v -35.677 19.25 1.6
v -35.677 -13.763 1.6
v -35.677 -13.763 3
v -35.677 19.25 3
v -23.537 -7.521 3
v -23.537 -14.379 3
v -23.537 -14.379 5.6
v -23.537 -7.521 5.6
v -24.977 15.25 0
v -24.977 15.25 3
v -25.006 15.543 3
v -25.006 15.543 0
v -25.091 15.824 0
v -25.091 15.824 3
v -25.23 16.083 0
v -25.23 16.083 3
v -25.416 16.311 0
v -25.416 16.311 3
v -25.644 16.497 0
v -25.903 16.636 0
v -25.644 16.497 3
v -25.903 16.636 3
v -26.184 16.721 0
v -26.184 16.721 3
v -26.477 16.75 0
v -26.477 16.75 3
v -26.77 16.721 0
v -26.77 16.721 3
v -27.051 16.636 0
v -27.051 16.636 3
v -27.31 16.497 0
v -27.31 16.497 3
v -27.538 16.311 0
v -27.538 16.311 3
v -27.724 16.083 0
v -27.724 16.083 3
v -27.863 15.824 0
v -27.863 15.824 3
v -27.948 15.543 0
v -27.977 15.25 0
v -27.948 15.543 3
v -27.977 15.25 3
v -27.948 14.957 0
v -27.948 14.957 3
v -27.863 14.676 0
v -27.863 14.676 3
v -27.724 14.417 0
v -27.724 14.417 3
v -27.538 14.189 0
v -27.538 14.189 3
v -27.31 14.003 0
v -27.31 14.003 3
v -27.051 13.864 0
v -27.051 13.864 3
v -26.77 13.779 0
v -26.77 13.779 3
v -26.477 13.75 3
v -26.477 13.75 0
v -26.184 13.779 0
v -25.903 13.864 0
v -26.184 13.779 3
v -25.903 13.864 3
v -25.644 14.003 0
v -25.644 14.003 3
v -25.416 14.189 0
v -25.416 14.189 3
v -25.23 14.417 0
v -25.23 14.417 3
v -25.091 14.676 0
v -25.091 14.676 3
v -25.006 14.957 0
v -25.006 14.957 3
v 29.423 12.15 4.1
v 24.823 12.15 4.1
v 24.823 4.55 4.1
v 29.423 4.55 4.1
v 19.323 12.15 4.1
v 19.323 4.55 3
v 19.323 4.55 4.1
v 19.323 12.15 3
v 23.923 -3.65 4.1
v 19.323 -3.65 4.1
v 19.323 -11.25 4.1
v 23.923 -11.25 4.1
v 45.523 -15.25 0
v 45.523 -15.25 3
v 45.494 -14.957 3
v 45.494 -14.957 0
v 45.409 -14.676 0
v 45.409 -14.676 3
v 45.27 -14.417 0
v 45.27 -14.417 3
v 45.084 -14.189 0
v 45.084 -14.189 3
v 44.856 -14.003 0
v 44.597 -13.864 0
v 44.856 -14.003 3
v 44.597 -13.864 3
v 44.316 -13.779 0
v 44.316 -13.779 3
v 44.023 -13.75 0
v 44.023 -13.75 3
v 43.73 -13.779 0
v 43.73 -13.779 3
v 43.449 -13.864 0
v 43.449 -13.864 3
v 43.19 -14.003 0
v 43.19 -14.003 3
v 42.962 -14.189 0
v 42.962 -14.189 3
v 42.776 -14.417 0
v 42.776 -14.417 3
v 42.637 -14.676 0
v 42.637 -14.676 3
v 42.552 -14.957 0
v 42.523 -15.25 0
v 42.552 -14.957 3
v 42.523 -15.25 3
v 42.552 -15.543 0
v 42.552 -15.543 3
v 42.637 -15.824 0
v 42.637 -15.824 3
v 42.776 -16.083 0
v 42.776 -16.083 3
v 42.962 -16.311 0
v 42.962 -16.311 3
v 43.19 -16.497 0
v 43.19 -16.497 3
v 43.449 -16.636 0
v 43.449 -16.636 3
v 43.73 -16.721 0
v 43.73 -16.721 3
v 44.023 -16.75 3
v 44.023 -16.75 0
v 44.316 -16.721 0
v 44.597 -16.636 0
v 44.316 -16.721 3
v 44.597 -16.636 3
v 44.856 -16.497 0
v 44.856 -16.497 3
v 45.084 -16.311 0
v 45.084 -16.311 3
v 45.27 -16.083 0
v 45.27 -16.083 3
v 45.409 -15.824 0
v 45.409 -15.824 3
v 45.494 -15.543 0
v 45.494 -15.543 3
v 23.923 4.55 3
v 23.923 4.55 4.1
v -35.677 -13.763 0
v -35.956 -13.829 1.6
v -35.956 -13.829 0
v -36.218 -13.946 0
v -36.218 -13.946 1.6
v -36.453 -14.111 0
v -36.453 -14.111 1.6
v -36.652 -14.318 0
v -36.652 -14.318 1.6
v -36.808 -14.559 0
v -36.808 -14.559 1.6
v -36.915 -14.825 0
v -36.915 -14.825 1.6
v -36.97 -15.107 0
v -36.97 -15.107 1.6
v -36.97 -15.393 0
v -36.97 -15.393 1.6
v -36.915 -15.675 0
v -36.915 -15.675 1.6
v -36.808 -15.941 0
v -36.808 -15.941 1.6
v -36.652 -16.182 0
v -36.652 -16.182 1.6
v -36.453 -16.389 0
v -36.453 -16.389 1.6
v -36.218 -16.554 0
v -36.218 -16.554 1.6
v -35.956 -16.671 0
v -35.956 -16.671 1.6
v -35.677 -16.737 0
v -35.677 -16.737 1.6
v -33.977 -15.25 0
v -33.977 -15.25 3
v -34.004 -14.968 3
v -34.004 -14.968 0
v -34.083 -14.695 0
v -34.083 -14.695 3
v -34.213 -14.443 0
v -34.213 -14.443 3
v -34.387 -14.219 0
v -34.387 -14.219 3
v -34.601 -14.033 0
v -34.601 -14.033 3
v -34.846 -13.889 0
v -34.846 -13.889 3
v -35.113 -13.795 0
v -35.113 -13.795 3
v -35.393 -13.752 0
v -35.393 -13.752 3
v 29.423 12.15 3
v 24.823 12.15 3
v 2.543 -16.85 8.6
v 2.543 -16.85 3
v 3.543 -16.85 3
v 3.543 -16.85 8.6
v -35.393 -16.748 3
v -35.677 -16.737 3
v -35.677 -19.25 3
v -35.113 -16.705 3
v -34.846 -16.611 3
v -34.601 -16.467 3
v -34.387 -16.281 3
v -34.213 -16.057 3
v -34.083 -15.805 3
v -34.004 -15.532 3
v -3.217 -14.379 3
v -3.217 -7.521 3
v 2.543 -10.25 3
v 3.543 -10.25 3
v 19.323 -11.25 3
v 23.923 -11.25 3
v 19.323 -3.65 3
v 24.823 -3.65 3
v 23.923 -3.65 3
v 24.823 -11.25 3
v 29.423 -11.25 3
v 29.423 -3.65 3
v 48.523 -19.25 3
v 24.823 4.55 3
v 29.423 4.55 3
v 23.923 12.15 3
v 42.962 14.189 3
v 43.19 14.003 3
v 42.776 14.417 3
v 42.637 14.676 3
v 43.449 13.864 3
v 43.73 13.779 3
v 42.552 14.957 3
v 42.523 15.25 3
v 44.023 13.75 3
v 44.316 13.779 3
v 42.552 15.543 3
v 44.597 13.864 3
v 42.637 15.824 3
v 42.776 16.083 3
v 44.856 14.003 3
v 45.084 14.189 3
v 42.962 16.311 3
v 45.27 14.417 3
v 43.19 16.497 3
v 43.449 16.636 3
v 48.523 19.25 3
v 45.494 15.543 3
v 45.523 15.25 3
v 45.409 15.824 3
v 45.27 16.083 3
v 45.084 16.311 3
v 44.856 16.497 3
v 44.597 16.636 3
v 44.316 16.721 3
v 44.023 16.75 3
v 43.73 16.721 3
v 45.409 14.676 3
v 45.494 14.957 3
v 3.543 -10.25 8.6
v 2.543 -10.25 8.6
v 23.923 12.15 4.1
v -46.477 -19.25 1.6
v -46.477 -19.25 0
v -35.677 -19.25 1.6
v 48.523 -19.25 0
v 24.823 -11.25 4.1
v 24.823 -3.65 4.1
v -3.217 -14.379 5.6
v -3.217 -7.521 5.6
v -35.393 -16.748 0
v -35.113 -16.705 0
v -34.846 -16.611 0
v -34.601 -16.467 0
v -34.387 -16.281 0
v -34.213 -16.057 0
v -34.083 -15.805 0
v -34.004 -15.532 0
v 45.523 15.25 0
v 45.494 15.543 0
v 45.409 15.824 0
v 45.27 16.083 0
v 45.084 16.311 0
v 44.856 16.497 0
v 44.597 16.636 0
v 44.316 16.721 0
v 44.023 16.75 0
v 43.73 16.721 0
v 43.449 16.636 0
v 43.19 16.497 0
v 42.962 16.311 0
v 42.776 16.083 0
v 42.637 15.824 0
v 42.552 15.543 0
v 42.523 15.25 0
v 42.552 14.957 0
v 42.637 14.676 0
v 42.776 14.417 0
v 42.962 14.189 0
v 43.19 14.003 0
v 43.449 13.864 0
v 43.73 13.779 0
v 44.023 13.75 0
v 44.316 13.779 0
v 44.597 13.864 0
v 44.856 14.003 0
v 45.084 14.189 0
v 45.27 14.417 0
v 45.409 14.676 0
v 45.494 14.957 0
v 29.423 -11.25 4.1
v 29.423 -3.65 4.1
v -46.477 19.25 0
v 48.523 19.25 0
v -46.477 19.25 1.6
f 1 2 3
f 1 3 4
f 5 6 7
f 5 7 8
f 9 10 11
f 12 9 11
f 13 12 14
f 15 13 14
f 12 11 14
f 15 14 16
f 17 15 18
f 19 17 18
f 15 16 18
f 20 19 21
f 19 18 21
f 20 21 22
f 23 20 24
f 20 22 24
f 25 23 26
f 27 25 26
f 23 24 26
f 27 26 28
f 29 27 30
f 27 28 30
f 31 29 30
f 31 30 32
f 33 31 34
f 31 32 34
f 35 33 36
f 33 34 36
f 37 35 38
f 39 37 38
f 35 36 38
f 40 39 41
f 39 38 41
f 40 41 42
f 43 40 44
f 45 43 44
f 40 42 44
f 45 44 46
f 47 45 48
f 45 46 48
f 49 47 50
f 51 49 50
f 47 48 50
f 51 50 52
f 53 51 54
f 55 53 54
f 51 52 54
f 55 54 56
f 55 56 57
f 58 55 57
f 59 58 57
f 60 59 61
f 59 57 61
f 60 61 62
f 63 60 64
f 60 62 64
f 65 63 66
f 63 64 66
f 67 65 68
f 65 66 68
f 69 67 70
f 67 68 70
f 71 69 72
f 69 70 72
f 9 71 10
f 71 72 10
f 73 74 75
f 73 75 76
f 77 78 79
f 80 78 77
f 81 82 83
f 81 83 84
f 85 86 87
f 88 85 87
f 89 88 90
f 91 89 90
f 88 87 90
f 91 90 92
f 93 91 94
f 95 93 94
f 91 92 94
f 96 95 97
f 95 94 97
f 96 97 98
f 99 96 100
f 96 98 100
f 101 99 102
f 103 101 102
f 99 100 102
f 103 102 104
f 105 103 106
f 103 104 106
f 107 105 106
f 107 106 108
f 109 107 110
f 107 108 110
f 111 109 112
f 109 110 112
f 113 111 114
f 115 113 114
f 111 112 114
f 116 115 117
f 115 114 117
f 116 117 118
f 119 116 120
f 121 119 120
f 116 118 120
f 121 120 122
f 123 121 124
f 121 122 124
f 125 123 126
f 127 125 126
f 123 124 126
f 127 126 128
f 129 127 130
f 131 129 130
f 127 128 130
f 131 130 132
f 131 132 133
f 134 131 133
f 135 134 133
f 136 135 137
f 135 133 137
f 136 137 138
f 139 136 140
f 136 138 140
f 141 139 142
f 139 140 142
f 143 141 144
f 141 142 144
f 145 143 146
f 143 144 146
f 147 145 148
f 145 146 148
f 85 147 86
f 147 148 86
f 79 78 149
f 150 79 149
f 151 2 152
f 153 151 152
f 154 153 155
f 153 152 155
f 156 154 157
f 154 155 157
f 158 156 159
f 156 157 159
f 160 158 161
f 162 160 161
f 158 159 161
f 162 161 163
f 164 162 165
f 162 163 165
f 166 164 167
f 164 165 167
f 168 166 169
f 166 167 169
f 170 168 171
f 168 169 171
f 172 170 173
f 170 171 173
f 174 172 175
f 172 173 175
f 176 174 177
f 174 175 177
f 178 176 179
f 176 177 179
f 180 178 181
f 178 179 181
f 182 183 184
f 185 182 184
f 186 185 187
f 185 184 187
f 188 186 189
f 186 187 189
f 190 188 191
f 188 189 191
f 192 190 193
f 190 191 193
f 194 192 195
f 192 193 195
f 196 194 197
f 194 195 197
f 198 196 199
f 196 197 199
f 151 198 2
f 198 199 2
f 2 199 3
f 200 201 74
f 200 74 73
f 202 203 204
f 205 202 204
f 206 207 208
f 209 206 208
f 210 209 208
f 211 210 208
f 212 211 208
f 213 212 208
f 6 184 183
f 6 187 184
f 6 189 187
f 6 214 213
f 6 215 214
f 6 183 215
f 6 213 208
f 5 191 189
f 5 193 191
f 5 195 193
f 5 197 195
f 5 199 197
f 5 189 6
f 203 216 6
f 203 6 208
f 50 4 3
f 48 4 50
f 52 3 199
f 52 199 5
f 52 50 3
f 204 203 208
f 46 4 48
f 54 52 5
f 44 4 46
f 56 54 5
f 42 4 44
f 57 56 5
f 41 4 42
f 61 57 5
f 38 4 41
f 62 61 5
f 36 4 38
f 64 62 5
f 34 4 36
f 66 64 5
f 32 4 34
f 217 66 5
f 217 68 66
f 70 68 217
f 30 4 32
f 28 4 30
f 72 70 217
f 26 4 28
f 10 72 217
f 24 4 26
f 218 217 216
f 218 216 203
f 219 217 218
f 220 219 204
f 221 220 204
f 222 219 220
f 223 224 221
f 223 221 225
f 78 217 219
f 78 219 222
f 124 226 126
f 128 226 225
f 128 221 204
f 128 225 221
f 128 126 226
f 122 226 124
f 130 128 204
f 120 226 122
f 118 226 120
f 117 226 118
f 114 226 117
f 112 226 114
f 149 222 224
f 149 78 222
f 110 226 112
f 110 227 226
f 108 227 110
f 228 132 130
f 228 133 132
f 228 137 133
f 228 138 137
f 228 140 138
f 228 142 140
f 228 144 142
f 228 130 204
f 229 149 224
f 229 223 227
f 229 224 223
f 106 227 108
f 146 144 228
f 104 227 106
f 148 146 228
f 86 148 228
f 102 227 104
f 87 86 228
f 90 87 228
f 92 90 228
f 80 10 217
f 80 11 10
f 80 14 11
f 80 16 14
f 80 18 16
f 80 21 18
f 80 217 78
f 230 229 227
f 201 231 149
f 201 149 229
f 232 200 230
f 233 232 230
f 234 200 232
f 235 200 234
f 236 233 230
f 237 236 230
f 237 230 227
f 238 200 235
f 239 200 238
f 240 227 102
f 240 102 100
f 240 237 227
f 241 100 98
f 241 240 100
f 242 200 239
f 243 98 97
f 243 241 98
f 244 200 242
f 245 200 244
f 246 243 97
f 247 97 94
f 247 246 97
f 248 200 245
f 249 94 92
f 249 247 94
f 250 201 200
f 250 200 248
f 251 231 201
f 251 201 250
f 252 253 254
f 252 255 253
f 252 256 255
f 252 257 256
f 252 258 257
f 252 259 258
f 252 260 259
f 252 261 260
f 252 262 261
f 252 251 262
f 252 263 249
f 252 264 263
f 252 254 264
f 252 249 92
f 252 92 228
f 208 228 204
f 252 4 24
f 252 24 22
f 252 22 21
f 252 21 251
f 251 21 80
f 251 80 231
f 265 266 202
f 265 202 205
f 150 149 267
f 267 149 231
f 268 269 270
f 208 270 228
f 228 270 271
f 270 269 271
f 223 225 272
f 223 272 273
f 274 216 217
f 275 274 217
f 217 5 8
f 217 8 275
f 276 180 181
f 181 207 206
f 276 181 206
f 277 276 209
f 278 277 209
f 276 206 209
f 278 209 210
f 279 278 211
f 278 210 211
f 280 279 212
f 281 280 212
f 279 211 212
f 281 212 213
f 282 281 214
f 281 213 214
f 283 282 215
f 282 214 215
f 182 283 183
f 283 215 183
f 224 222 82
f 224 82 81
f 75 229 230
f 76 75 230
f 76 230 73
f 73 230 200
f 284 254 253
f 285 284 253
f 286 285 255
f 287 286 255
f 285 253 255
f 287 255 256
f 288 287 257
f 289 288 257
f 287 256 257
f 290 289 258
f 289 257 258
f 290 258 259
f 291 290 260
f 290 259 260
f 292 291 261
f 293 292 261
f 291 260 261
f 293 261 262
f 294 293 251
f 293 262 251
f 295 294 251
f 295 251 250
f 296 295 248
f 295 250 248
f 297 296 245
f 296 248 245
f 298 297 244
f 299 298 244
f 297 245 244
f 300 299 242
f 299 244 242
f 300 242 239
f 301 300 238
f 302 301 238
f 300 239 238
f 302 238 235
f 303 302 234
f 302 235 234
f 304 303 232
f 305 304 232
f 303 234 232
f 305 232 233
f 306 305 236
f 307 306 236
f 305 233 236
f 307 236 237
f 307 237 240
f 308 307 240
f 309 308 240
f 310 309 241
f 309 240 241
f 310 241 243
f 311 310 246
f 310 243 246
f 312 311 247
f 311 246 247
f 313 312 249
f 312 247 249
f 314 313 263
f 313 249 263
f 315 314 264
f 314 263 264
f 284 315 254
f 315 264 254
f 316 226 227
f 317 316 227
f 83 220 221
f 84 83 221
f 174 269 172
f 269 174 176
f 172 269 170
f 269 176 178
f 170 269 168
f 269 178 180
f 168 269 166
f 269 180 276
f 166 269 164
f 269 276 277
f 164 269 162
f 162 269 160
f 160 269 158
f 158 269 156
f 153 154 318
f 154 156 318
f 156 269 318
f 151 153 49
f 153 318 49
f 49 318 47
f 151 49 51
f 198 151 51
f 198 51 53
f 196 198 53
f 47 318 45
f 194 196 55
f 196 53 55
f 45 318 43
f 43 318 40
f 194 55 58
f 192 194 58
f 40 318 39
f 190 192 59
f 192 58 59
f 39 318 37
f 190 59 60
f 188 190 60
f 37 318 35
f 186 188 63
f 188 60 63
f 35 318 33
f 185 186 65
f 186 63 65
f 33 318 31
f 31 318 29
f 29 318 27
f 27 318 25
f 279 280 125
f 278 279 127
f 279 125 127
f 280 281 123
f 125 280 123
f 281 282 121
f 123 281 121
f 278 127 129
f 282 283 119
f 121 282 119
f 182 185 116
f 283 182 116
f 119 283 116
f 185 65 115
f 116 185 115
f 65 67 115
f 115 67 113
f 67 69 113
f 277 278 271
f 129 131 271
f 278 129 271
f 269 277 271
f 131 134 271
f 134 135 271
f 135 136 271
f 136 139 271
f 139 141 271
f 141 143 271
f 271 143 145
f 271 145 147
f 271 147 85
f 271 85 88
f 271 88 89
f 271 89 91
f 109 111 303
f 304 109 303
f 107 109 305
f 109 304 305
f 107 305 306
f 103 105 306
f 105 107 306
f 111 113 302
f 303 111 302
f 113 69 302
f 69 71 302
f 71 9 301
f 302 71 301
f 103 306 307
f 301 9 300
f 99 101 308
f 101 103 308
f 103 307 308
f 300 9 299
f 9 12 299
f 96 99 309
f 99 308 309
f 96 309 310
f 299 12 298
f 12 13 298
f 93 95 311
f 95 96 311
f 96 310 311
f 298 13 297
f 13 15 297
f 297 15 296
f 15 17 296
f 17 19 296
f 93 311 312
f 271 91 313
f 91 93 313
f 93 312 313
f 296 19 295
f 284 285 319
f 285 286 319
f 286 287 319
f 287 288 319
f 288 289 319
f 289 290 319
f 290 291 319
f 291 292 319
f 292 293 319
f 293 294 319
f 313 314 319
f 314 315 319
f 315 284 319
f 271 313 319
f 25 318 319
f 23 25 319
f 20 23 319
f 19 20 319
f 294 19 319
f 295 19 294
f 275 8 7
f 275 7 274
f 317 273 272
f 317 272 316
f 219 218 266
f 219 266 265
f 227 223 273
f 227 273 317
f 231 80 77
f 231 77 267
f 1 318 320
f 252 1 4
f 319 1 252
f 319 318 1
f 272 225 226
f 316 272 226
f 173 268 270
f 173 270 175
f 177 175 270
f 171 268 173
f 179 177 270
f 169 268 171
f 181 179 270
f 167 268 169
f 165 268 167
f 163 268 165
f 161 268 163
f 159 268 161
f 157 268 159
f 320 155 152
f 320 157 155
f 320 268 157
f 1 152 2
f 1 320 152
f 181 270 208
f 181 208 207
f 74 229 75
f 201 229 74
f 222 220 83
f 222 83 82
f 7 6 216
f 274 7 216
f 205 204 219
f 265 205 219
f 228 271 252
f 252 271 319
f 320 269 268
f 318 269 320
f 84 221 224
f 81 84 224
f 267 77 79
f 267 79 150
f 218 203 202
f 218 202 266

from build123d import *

# Parameters (mm, degrees)
F0_W      = 95
F0_H      = 38.5
F1_DEPTH  = 1.6
F2_W      = 84.2
F2_H      = 38.5
F3_DEPTH  = 1.4
F4_W      = 20.32
F4_H      = 6.858
F5_DEPTH  = 2.6
F6_W      = 4.6
F6_H      = 7.6
F7_DEPTH  = 1.1
F8_W      = 1
F8_H      = 6.6
F9_DEPTH  = 5.6
F10_R     = 1.5
F11_DEPTH = 3


with BuildPart() as f1:
    # F0 (on Top) → F1 (new body)
    with BuildSketch(Plane.XY):
        with Locations((1.023077, 0)):
            Rectangle(F0_W, F0_H)
    extrude(amount=F1_DEPTH)

    # F2 (on face) → F3 (join)
    with BuildSketch(Plane.XY.offset(1.6)):
        with Locations((6.423077, 0)):
            Rectangle(F2_W, F2_H)
    extrude(amount=F3_DEPTH)

    # F4 (on face) → F5 (join)
    with BuildSketch(Plane.XY.offset(3)):
        with Locations((-13.376923, -10.95)):
            Rectangle(F4_W, F4_H)
    extrude(amount=F5_DEPTH)

    # F6 (on face) → F7 (join)
    with BuildSketch(Plane.XY.offset(3)):
        with Locations((27.123077, -7.45)):
            Rectangle(F6_W, F6_H)
        with Locations((21.623077, -7.45)):
            Rectangle(F6_W, F6_H)
        with Locations((21.623077, 8.35)):
            Rectangle(F6_W, F6_H)
        with Locations((27.123077, 8.35)):
            Rectangle(F6_W, F6_H)
    extrude(amount=F7_DEPTH)

    # F8 (on face) → F9 (join)
    with BuildSketch(Plane.XY.offset(3)):
        with Locations((3.043077, -13.55)):
            Rectangle(F8_W, F8_H)
    extrude(amount=F9_DEPTH)

    # F10 (on face) → F11 (cut)
    with BuildSketch(Plane.XY.offset(3)):
        with Locations((-26.476923, 15.25)):
            Circle(F10_R)
        with BuildLine():
            Line((-35.676923, -16.736607), (-35.676923, -13.763393))
            ThreePointArc((-35.676923, -13.763393), (-36.976923, -15.25), (-35.676923, -16.736607))
        make_face()
        with BuildLine():
            ThreePointArc((-35.676923, -16.736607), (-34.489502, -16.379159), (-33.976923, -15.25))
            ThreePointArc((-33.976923, -15.25), (-34.489502, -14.120841), (-35.676923, -13.763393))
            Line((-35.676923, -13.763393), (-35.676923, -16.736607))
        make_face()
        with Locations((44.023077, 15.25)):
            Circle(F10_R)
        with Locations((44.023077, -15.25)):
            Circle(F10_R)
    extrude(amount=-F11_DEPTH, mode=Mode.SUBTRACT)


solid = f1.part
